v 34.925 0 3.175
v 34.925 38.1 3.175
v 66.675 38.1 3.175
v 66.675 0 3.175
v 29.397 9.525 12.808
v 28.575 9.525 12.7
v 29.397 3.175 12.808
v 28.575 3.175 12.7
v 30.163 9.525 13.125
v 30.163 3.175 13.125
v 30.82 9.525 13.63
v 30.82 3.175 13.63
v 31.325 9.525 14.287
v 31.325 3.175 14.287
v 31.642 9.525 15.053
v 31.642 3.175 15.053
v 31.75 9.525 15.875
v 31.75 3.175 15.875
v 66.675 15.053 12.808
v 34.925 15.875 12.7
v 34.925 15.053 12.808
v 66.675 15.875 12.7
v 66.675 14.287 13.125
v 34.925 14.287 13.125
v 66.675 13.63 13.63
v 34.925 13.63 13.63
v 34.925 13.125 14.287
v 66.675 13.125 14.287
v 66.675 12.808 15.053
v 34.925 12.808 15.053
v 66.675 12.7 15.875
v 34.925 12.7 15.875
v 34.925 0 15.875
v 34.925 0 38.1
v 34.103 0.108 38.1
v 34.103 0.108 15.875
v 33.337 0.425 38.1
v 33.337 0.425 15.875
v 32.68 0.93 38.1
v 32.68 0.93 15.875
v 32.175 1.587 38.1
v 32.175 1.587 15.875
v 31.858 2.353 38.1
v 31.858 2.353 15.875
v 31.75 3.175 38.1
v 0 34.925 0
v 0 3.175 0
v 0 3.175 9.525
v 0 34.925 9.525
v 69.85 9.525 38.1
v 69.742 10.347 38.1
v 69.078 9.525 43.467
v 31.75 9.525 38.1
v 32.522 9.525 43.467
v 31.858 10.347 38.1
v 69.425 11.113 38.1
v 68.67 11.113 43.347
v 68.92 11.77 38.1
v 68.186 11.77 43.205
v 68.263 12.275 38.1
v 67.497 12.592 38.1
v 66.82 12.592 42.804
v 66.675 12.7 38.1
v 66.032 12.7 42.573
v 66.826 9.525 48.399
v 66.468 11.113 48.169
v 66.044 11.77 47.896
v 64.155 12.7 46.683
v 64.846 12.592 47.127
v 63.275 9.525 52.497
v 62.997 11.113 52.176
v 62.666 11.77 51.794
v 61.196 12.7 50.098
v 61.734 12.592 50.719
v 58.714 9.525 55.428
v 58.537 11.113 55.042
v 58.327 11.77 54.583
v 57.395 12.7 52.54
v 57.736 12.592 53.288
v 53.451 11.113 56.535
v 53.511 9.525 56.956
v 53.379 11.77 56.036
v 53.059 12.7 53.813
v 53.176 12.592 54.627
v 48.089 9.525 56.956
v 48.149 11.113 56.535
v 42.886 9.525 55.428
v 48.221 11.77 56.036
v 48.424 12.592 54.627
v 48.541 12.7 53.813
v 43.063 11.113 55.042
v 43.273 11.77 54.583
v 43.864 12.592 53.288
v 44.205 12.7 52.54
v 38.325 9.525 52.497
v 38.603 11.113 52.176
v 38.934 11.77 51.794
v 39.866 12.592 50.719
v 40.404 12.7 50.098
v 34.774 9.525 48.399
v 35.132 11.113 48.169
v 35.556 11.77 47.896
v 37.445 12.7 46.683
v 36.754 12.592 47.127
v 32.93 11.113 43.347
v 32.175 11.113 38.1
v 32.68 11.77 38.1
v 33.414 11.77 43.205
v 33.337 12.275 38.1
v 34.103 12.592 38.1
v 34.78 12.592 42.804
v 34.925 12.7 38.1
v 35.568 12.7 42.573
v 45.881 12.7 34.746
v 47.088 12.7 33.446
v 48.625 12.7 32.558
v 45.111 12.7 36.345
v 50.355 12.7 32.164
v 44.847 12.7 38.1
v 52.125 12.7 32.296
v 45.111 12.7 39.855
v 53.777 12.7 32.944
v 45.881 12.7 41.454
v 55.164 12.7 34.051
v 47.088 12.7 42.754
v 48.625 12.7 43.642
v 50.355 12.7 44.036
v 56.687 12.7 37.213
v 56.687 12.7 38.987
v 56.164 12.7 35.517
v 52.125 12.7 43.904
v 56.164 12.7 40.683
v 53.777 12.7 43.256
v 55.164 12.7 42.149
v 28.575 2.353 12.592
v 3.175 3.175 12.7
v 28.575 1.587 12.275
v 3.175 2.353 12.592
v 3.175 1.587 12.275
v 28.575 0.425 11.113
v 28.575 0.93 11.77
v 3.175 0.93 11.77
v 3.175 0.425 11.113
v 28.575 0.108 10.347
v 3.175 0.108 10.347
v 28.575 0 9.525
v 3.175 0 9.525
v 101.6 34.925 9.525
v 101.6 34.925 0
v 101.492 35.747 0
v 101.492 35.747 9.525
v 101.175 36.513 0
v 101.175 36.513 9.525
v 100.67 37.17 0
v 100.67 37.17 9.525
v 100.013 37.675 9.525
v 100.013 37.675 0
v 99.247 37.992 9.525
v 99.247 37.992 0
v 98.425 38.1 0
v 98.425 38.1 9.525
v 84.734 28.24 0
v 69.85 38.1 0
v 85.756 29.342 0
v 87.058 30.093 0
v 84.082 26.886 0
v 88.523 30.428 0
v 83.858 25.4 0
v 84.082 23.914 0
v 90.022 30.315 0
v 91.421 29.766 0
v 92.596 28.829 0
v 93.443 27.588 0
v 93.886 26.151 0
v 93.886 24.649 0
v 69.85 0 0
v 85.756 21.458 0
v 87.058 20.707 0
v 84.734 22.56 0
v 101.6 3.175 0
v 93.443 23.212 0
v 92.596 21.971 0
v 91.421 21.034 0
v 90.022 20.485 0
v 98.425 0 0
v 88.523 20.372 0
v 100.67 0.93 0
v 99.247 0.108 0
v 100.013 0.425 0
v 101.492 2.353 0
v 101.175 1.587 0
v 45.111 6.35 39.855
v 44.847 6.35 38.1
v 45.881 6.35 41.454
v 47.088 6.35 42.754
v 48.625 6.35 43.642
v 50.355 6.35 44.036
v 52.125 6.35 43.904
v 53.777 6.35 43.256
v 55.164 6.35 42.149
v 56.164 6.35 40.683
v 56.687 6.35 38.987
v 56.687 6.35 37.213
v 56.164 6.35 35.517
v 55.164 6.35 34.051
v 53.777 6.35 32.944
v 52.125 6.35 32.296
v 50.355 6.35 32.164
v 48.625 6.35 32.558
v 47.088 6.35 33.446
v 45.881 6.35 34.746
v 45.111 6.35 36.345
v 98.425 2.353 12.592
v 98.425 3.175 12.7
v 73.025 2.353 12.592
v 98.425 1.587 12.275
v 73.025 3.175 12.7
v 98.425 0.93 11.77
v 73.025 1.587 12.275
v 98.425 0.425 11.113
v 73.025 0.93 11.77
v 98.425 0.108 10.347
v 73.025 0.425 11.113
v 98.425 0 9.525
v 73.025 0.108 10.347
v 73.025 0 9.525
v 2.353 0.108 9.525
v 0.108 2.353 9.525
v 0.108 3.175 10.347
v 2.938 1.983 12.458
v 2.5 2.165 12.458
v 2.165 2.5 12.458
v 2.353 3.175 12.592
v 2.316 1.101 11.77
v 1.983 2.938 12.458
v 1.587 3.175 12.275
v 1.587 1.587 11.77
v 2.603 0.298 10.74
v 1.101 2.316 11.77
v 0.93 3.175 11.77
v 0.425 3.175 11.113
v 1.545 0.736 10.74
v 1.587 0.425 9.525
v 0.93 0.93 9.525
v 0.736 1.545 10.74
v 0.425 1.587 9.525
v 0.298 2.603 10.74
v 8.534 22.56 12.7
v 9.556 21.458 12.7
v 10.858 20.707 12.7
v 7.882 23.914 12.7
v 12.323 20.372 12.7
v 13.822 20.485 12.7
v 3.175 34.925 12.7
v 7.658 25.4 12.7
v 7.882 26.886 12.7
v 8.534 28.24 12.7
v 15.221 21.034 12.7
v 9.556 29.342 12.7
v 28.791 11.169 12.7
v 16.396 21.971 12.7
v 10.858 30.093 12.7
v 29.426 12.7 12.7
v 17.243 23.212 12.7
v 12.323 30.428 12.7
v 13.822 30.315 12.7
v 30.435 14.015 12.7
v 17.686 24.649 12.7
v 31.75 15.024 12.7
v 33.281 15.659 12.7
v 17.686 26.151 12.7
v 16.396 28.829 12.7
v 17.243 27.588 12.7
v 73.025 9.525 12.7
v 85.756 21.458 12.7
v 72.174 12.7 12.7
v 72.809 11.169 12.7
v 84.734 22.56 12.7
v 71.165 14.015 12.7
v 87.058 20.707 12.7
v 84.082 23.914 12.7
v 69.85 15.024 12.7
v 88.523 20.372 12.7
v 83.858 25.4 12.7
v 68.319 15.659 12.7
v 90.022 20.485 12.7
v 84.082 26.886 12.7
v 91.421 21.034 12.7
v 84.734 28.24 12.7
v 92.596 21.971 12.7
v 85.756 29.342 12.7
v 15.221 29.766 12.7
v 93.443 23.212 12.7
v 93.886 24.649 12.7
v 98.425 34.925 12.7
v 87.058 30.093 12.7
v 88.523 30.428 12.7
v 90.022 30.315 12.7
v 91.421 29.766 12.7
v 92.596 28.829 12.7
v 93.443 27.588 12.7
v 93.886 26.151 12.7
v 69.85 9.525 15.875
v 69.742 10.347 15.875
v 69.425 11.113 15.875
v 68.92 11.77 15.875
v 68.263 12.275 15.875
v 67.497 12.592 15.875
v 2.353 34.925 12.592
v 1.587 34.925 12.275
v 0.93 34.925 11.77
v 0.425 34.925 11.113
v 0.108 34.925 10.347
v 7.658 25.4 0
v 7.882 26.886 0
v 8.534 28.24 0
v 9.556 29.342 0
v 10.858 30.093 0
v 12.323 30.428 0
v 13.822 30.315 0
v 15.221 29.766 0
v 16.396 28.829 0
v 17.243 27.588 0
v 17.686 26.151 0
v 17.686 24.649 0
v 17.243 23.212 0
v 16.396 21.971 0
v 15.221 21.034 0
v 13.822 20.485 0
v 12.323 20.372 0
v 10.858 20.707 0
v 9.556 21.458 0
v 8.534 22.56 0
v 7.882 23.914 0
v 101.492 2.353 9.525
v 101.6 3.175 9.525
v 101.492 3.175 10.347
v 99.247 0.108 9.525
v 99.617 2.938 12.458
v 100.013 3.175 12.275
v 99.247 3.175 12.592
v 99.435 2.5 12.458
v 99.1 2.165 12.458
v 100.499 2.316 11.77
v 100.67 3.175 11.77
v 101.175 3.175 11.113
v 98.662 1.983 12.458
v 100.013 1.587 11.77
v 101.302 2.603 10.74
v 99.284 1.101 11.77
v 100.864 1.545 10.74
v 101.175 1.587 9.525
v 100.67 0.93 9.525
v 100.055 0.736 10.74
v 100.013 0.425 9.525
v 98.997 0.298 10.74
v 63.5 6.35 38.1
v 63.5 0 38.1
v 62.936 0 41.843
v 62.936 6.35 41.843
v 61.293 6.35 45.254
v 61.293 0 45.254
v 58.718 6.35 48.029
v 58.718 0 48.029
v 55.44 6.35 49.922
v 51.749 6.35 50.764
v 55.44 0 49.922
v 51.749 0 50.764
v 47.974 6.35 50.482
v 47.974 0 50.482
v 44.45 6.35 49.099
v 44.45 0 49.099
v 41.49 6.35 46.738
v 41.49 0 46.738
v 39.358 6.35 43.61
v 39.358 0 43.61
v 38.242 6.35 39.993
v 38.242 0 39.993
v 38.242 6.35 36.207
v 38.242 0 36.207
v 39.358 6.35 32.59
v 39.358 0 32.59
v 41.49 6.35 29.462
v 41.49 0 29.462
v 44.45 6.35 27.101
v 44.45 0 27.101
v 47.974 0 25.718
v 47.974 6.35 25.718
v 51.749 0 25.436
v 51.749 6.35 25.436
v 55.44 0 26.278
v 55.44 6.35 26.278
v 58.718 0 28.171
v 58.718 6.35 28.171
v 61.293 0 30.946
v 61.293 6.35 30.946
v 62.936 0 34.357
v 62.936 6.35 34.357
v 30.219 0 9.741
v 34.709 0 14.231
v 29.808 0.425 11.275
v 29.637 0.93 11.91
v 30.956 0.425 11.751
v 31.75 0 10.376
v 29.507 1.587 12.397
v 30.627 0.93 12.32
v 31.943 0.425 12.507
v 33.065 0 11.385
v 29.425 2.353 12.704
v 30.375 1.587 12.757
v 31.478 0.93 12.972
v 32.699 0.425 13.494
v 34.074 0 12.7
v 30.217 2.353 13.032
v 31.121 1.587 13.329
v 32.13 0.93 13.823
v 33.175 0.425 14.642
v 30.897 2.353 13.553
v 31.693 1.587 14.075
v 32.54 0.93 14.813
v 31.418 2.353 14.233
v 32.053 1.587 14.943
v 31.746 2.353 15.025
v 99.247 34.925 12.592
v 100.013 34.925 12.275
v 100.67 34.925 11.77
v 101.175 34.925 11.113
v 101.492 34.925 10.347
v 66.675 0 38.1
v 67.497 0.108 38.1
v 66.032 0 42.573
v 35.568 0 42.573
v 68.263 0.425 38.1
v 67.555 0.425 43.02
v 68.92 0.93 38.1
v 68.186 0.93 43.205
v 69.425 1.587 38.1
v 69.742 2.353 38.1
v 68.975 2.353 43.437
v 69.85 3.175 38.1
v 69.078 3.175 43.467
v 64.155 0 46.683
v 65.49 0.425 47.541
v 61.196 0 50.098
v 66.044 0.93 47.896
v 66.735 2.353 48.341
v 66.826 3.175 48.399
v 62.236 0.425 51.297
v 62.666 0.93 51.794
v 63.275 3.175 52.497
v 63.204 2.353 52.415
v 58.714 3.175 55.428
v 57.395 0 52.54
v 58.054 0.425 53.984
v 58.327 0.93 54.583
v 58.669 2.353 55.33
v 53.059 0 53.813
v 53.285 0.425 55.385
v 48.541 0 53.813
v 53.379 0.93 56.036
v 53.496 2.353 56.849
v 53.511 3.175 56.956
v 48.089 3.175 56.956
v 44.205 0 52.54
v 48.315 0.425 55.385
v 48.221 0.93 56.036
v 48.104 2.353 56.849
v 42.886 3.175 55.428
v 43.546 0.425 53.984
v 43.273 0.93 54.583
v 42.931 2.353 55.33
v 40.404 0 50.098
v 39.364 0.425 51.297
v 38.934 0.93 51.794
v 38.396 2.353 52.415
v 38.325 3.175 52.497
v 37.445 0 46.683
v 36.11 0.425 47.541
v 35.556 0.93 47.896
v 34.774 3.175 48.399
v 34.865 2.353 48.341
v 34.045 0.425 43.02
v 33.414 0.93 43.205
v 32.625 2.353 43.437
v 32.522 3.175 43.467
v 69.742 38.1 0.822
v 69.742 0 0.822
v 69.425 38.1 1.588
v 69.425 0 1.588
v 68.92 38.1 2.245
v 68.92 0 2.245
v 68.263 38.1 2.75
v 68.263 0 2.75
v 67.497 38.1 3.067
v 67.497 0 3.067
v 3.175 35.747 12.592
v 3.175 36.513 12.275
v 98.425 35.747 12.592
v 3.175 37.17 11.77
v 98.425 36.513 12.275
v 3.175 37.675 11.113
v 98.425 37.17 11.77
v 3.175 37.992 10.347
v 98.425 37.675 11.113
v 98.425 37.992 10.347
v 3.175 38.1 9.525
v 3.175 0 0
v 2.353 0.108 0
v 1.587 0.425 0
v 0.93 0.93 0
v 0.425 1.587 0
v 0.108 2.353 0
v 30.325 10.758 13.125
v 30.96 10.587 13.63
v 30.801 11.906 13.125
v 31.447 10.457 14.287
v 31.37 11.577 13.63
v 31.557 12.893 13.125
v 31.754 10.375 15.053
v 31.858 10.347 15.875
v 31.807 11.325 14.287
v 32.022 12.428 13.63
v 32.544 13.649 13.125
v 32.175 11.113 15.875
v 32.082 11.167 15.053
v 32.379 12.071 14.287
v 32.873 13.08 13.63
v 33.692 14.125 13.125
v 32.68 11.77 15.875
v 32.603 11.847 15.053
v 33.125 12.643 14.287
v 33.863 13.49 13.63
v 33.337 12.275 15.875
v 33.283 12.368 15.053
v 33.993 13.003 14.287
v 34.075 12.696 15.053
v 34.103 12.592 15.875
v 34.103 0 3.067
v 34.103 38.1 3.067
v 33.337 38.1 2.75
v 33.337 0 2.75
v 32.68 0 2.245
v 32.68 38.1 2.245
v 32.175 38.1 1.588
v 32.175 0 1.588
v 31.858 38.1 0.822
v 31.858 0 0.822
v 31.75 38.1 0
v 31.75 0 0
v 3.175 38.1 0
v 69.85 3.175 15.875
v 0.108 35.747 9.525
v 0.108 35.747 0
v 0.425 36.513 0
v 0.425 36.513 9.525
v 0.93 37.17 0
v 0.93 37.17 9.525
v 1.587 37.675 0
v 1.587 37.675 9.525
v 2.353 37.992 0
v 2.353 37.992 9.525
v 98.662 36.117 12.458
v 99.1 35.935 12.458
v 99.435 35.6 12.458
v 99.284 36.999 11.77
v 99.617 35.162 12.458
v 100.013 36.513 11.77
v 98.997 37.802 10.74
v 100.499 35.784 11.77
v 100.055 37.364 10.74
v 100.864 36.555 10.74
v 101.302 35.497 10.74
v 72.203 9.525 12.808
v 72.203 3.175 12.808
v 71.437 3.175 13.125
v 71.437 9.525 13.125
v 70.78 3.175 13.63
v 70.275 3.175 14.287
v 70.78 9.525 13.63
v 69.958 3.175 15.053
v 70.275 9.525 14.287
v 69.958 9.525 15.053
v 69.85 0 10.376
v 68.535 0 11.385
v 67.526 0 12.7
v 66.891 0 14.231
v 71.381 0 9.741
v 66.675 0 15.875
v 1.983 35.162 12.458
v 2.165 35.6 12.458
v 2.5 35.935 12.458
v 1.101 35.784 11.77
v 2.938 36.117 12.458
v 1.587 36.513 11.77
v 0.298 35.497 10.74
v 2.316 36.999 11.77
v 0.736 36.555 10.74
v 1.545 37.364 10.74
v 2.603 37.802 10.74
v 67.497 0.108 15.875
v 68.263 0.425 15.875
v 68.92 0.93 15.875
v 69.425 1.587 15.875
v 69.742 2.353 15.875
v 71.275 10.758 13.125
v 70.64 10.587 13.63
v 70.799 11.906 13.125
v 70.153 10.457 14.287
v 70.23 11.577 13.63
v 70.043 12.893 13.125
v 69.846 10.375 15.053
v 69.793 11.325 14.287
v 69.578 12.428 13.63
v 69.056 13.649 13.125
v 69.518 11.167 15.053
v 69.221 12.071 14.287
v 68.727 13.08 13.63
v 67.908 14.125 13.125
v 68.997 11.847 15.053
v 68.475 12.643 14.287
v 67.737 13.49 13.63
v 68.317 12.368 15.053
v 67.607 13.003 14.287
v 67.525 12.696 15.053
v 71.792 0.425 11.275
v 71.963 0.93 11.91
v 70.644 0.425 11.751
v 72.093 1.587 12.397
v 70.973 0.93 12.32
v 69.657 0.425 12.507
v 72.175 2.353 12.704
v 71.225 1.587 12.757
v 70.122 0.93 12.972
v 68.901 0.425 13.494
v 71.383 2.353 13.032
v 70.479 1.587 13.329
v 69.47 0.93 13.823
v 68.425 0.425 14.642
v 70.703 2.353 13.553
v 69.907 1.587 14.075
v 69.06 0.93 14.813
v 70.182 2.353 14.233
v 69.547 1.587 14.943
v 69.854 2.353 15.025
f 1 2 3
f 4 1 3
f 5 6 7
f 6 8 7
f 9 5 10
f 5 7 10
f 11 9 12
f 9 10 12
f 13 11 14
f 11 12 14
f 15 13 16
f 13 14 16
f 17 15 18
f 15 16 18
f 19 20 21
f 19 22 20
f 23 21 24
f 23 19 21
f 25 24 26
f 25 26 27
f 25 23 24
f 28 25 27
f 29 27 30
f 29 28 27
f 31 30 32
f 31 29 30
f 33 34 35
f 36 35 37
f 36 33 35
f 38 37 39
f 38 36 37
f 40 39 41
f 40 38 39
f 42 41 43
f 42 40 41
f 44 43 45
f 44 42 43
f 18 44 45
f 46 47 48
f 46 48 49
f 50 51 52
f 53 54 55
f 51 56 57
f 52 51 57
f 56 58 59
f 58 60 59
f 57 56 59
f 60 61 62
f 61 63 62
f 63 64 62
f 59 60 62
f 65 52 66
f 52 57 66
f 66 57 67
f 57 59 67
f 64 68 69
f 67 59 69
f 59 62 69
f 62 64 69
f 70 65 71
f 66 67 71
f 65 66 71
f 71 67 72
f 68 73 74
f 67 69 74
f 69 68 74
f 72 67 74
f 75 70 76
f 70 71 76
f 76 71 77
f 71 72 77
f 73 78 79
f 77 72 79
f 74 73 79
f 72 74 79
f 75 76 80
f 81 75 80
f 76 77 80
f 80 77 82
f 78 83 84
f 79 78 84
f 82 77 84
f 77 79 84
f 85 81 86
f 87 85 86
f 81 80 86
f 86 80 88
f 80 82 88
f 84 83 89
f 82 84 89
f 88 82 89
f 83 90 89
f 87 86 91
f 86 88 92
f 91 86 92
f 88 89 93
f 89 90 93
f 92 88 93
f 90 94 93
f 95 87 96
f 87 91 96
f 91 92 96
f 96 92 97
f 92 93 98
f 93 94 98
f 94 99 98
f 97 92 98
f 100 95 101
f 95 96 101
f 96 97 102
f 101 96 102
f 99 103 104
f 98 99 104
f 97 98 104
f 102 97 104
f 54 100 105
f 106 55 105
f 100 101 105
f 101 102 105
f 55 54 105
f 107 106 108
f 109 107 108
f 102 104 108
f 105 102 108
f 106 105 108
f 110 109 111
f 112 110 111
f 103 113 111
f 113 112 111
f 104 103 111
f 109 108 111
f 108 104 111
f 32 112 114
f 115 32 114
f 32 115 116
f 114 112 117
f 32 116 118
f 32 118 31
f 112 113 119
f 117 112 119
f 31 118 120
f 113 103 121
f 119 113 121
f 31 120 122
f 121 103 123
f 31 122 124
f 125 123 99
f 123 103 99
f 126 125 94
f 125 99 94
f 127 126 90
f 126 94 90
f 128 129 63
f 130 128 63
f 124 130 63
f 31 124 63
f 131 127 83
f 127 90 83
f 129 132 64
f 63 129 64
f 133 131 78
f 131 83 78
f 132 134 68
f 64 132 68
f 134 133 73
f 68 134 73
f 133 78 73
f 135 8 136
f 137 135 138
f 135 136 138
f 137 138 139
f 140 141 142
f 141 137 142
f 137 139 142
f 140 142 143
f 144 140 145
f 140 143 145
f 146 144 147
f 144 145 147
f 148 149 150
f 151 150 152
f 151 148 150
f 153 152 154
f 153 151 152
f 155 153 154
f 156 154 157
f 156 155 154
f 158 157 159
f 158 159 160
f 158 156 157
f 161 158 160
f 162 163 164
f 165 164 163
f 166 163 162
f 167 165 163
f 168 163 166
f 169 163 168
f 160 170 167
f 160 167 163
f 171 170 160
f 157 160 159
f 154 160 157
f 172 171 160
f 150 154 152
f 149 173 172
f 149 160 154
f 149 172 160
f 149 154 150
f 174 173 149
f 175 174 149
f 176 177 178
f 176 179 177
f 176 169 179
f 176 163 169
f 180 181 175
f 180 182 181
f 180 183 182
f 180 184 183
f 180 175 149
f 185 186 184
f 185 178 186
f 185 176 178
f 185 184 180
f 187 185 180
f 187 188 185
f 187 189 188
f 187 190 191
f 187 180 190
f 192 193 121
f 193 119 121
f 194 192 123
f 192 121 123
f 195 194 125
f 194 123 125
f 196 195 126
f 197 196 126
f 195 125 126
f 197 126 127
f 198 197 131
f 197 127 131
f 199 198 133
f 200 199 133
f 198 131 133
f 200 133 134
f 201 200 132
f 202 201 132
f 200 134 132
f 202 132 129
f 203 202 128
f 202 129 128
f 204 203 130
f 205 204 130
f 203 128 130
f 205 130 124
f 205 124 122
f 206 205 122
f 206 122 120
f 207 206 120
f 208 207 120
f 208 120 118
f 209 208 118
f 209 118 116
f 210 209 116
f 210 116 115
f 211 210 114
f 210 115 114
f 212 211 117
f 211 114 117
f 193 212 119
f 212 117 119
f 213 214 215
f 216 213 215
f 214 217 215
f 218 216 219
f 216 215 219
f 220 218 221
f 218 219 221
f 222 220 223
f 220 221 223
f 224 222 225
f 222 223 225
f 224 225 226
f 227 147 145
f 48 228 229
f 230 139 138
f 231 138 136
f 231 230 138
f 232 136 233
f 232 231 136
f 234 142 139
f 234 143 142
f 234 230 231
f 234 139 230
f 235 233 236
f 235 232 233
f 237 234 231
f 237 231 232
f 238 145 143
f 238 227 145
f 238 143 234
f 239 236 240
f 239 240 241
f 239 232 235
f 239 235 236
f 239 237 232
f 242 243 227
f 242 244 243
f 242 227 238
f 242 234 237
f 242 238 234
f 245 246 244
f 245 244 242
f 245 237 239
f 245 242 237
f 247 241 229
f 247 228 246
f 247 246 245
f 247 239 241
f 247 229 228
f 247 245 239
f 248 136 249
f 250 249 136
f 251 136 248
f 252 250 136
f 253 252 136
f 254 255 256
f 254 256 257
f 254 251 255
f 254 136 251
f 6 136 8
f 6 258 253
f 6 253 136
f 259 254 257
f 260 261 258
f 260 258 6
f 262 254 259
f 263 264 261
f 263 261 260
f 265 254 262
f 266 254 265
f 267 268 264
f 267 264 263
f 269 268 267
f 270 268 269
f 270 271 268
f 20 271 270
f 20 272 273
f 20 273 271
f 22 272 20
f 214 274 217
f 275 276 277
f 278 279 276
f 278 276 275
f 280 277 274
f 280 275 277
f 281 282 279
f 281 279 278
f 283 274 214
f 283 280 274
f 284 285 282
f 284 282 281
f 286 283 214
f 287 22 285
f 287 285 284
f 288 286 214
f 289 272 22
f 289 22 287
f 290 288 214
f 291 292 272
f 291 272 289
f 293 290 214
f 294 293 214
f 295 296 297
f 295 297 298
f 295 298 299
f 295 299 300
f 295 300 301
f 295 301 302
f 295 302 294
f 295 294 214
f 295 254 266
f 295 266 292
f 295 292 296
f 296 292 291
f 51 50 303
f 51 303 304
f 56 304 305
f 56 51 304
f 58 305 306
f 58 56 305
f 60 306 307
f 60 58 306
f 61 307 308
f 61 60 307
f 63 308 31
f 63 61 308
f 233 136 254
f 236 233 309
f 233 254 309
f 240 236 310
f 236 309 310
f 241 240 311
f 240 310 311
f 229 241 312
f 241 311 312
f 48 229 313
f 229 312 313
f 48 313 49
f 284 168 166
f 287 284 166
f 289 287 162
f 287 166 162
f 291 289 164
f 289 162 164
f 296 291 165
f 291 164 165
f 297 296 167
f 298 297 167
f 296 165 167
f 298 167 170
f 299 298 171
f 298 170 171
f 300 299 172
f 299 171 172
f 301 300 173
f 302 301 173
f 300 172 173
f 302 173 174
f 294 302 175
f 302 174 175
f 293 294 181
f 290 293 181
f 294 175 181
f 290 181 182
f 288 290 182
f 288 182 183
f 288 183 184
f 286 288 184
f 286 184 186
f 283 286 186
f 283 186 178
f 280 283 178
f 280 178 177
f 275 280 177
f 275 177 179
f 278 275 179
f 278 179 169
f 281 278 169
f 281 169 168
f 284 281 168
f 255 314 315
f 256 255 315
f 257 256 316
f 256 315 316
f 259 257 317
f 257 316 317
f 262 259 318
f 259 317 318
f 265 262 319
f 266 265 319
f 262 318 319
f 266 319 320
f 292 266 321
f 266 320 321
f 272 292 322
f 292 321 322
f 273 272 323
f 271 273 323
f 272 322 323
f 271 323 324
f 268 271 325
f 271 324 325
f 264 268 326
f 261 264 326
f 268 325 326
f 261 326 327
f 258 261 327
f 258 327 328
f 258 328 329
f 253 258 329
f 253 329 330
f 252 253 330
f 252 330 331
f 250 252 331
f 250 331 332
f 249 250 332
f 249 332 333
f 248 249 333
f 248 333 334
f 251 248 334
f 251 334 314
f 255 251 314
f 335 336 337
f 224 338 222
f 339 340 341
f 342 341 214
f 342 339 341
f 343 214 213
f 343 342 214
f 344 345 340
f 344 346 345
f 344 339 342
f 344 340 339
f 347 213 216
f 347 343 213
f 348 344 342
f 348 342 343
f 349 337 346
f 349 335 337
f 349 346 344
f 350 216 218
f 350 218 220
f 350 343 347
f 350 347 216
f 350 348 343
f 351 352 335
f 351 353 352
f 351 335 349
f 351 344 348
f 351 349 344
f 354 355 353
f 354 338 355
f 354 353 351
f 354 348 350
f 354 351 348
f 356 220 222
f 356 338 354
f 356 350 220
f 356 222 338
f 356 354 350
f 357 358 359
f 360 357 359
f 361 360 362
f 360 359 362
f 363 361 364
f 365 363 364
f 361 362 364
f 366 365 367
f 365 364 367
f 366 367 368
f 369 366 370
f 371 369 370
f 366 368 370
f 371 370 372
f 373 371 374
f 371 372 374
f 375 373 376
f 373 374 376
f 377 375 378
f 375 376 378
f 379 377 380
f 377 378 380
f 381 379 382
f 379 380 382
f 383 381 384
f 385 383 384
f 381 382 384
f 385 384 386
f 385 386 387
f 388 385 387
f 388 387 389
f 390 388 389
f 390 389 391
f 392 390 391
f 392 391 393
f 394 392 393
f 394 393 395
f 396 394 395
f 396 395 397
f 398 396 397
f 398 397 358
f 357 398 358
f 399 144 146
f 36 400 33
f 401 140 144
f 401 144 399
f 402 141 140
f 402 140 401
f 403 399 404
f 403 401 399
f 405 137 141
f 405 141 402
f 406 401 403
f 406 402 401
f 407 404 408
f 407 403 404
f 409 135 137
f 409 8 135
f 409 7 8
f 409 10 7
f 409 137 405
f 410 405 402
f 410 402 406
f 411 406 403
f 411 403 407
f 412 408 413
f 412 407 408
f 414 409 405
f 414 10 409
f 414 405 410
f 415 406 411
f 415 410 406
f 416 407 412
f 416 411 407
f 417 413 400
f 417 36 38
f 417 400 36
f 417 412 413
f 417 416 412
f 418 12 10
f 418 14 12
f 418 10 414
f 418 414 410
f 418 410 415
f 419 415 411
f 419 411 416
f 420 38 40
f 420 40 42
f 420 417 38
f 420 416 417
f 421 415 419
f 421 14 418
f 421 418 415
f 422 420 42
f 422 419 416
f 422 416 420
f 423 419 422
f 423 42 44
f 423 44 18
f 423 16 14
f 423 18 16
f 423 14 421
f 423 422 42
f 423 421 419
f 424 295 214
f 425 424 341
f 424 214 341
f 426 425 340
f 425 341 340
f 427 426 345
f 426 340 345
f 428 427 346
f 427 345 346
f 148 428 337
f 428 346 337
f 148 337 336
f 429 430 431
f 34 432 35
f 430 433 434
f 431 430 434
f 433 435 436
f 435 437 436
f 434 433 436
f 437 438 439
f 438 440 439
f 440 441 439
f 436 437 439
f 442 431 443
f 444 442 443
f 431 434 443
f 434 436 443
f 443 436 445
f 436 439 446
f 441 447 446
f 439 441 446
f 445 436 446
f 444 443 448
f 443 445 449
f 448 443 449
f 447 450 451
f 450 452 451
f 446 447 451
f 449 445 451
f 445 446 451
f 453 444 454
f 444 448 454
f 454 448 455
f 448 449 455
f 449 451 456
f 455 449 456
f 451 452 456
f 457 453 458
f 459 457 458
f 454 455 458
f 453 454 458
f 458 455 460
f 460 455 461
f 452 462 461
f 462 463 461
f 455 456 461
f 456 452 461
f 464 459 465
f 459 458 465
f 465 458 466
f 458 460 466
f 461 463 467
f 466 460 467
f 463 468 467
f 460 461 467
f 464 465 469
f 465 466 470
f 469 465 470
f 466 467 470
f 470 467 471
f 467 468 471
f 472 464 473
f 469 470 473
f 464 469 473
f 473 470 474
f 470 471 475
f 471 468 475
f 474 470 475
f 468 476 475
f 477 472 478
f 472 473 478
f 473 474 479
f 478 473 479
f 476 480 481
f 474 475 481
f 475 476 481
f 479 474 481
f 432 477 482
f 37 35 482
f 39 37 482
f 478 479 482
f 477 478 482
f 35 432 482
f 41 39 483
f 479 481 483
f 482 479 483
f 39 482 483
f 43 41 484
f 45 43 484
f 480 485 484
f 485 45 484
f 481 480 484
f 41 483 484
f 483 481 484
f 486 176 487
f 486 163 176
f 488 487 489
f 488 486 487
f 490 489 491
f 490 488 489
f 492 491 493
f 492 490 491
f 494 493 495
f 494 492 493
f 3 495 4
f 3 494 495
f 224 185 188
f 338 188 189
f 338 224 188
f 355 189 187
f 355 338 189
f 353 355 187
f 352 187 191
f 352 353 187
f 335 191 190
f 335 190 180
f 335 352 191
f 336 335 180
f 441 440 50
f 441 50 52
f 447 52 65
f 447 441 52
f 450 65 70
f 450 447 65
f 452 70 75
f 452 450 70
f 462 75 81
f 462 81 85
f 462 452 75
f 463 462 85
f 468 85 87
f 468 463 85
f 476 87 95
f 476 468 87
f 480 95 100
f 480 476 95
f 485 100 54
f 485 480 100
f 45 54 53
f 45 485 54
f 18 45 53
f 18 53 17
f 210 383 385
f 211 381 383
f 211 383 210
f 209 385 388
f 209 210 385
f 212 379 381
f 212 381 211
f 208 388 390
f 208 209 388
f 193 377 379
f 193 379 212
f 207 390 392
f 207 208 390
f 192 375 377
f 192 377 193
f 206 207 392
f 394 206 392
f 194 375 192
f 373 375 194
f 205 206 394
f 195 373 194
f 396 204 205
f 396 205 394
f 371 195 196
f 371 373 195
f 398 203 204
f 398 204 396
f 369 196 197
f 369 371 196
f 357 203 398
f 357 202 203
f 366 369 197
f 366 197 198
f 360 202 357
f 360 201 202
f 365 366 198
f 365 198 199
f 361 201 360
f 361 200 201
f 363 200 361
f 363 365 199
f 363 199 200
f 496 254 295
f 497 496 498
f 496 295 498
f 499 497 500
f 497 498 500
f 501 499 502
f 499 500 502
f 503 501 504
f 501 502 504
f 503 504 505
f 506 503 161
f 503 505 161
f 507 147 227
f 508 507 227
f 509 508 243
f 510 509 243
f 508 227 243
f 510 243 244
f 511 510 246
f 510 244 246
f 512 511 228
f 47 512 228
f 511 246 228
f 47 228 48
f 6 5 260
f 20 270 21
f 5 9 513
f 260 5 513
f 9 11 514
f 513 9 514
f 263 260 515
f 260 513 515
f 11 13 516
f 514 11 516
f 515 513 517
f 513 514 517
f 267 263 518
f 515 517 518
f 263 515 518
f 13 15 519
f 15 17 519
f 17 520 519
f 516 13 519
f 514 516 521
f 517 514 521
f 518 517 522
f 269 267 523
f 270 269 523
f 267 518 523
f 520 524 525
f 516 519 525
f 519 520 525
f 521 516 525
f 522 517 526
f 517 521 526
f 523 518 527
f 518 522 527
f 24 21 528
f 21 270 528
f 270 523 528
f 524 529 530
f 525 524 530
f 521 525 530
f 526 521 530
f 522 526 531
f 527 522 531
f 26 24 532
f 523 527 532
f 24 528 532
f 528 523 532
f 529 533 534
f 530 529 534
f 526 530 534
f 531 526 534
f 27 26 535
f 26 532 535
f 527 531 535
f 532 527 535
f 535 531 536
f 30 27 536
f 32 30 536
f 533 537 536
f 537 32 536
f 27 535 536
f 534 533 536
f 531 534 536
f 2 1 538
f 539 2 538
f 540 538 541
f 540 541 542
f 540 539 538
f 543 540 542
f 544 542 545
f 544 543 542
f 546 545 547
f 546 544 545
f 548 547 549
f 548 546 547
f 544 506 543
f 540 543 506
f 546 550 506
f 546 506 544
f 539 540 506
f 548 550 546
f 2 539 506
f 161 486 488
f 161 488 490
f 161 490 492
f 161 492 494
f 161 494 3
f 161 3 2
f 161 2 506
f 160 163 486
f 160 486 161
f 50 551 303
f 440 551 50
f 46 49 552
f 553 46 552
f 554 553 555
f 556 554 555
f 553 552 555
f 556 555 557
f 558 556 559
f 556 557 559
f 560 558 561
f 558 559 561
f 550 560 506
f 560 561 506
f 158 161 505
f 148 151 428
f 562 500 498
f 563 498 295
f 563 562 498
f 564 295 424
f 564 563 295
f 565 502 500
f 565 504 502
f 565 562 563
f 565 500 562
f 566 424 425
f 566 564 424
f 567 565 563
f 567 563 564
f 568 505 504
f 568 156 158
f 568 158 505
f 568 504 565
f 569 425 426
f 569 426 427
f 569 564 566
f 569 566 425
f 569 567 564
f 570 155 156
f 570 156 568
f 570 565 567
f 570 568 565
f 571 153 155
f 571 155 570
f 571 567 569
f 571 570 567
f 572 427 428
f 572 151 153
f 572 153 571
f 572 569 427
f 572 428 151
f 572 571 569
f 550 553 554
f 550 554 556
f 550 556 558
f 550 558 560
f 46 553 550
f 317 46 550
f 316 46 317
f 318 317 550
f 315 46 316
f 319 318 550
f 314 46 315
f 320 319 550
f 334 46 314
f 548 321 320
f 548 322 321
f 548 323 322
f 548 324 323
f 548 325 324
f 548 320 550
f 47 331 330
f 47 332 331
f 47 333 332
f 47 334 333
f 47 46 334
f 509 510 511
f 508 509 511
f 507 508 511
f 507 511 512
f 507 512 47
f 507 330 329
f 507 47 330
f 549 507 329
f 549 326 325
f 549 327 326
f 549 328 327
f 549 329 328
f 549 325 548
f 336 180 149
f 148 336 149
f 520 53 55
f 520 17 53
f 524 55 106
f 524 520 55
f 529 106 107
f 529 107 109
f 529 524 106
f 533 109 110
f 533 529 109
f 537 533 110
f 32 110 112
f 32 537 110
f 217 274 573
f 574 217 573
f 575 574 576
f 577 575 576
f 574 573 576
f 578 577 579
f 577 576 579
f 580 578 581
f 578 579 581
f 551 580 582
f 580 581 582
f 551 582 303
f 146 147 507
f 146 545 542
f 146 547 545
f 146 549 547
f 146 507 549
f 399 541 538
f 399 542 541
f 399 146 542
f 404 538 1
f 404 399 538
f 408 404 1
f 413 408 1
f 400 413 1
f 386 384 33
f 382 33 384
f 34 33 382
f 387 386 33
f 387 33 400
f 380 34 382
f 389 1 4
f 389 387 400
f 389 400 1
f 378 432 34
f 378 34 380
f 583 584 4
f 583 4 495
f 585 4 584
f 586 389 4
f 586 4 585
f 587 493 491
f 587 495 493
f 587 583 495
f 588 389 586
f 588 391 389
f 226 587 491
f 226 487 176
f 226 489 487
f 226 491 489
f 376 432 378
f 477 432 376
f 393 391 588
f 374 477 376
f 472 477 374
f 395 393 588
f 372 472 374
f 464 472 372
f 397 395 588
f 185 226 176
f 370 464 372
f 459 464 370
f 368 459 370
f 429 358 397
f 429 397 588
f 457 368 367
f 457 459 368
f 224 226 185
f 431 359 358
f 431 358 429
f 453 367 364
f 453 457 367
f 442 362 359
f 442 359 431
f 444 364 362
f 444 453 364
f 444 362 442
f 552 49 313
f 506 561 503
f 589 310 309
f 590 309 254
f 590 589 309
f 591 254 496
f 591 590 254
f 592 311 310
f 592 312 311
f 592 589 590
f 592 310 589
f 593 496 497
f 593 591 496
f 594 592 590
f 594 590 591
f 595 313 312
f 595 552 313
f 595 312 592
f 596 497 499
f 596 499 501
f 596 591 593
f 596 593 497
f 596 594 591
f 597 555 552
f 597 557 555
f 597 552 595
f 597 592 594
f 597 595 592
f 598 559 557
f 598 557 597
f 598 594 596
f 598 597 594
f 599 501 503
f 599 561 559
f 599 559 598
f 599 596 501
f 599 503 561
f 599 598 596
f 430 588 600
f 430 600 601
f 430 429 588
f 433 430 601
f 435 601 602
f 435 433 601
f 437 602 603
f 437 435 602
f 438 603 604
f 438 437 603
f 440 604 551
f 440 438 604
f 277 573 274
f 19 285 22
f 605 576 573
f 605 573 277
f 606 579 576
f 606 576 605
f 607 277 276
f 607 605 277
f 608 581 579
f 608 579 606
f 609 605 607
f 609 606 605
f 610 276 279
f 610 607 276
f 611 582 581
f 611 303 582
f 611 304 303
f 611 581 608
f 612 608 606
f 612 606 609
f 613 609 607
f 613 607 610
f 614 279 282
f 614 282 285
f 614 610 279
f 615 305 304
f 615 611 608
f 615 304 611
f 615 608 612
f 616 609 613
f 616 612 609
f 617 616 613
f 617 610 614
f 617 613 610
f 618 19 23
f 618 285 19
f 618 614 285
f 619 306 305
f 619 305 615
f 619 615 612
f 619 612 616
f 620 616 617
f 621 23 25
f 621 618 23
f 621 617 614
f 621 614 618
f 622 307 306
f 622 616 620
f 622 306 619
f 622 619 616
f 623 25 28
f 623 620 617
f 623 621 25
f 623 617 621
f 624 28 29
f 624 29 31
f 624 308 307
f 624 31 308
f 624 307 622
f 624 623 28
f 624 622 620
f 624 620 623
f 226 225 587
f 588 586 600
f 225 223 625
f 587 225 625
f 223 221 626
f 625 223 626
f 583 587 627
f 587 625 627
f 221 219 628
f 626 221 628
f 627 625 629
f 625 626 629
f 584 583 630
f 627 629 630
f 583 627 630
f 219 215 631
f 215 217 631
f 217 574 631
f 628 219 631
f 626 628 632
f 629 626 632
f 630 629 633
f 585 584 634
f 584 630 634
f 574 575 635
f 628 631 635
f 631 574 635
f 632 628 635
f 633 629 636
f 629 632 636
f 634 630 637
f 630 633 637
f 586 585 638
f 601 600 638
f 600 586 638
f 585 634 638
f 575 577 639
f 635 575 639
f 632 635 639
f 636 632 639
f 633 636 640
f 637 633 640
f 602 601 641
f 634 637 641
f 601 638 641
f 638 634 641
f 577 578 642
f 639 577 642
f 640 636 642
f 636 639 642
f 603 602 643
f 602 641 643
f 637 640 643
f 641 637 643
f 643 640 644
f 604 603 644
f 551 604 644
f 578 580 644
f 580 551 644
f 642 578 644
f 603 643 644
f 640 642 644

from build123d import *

# Parameters (mm, degrees)
F0_W           = 101.6
F0_H           = 38.1
F1_DEPTH       = 12.7
F3_DEPTH       = 12.7
F5_D           = 11.90625
F5_CBORE_D     = 25.4
F5_CBORE_DEPTH = 6.35
F6_W           = 38.1
F6_H           = 3.175
F7_DEPTH       = 38.101
F9_D           = 10.0838
F10_R          = 3.17499
F11_R          = 3.17499


# Not quite as in the source:
# - a fillet or chamfer is up to 0.001 mm smaller than in the source, because OpenCascade refuses the exact size
# - a length typed as a fraction of an inch, garbled in the dataset ("3 / 203.2 mm" for 3/8 in), is restored


with BuildPart() as f1:
    # F0 (on Top) → F1 (new body)
    with BuildSketch(Plane.XY):
        with Locations((50.8, 19.05)):
            Rectangle(F0_W, F0_H)
    extrude(amount=F1_DEPTH)

    # F2 (on Front) → F3 (join)
    with BuildSketch(Plane.XZ):
        with BuildLine():
            Line((31.75, 38.1), (31.75, 0))
            Line((31.75, 0), (69.85, 0))
            Line((69.85, 0), (69.85, 38.1))
            ThreePointArc((69.85, 38.1), (50.8, 57.15), (31.75, 38.1))
        make_face()
    extrude(amount=-F3_DEPTH)

    # F5 (through all)
    with Locations(Plane.XZ):
        with Locations((50.8, 38.1)):
            CounterBoreHole(F5_D / 2, F5_CBORE_D / 2, F5_CBORE_DEPTH)

    # F6 (on face) → F7 (cut, through all)
    with BuildSketch(Plane.XZ):
        with Locations((50.8, 1.5875)):
            Rectangle(F6_W, F6_H)
    extrude(amount=-F7_DEPTH, mode=Mode.SUBTRACT)

    # F9 (through all)
    with Locations(Plane.XY.offset(12.7)):
        with Locations((12.7, 25.4), (88.9, 25.4)):
            Hole(F9_D / 2)

    # F10 (radius 3.175 in the source; OpenCascade refuses exactly that, so slightly less here)
    f10_edges = [f1.edges().sort_by_distance(p)[0] for p in [
        (0, 0, 6.35),
        (0, 38.1, 6.35),
        (101.6, 0, 6.35),
        (101.6, 38.1, 6.35),
        (31.75, 19.05, 3.175),
        (69.85, 19.05, 3.175),
    ]]
    fillet(f10_edges, radius=F10_R)

    # F11 (radius 3.175 in the source; OpenCascade refuses exactly that, so slightly less here)
    f11_edges = [f1.edges().sort_by_distance(p)[0] for p in [
        (50.8, 38.1, 12.7),
        (101.6, 19.05, 12.7),
        (100.670067, 37.170067, 12.7),
        (100.670067, 0.929933, 12.7),
        (84.137505, 0, 12.7),
        (0.929933, 37.170067, 12.7),
        (0, 19.05, 12.7),
        (0.929933, 0.929933, 12.7),
        (17.462495, 0, 12.7),
        (31.75, 0, 25.4),
        (50.8, 0, 57.15),
        (69.85, 0, 25.4),
        (69.85, 6.35, 12.7),
        (31.75, 6.35, 12.7),
        (50.8, 12.7, 12.7),
        (31.75, 12.7, 25.4),
        (50.8, 12.7, 57.15),
        (69.85, 12.7, 25.4),
    ]]
    fillet(f11_edges, radius=F11_R)


solid = f1.part
